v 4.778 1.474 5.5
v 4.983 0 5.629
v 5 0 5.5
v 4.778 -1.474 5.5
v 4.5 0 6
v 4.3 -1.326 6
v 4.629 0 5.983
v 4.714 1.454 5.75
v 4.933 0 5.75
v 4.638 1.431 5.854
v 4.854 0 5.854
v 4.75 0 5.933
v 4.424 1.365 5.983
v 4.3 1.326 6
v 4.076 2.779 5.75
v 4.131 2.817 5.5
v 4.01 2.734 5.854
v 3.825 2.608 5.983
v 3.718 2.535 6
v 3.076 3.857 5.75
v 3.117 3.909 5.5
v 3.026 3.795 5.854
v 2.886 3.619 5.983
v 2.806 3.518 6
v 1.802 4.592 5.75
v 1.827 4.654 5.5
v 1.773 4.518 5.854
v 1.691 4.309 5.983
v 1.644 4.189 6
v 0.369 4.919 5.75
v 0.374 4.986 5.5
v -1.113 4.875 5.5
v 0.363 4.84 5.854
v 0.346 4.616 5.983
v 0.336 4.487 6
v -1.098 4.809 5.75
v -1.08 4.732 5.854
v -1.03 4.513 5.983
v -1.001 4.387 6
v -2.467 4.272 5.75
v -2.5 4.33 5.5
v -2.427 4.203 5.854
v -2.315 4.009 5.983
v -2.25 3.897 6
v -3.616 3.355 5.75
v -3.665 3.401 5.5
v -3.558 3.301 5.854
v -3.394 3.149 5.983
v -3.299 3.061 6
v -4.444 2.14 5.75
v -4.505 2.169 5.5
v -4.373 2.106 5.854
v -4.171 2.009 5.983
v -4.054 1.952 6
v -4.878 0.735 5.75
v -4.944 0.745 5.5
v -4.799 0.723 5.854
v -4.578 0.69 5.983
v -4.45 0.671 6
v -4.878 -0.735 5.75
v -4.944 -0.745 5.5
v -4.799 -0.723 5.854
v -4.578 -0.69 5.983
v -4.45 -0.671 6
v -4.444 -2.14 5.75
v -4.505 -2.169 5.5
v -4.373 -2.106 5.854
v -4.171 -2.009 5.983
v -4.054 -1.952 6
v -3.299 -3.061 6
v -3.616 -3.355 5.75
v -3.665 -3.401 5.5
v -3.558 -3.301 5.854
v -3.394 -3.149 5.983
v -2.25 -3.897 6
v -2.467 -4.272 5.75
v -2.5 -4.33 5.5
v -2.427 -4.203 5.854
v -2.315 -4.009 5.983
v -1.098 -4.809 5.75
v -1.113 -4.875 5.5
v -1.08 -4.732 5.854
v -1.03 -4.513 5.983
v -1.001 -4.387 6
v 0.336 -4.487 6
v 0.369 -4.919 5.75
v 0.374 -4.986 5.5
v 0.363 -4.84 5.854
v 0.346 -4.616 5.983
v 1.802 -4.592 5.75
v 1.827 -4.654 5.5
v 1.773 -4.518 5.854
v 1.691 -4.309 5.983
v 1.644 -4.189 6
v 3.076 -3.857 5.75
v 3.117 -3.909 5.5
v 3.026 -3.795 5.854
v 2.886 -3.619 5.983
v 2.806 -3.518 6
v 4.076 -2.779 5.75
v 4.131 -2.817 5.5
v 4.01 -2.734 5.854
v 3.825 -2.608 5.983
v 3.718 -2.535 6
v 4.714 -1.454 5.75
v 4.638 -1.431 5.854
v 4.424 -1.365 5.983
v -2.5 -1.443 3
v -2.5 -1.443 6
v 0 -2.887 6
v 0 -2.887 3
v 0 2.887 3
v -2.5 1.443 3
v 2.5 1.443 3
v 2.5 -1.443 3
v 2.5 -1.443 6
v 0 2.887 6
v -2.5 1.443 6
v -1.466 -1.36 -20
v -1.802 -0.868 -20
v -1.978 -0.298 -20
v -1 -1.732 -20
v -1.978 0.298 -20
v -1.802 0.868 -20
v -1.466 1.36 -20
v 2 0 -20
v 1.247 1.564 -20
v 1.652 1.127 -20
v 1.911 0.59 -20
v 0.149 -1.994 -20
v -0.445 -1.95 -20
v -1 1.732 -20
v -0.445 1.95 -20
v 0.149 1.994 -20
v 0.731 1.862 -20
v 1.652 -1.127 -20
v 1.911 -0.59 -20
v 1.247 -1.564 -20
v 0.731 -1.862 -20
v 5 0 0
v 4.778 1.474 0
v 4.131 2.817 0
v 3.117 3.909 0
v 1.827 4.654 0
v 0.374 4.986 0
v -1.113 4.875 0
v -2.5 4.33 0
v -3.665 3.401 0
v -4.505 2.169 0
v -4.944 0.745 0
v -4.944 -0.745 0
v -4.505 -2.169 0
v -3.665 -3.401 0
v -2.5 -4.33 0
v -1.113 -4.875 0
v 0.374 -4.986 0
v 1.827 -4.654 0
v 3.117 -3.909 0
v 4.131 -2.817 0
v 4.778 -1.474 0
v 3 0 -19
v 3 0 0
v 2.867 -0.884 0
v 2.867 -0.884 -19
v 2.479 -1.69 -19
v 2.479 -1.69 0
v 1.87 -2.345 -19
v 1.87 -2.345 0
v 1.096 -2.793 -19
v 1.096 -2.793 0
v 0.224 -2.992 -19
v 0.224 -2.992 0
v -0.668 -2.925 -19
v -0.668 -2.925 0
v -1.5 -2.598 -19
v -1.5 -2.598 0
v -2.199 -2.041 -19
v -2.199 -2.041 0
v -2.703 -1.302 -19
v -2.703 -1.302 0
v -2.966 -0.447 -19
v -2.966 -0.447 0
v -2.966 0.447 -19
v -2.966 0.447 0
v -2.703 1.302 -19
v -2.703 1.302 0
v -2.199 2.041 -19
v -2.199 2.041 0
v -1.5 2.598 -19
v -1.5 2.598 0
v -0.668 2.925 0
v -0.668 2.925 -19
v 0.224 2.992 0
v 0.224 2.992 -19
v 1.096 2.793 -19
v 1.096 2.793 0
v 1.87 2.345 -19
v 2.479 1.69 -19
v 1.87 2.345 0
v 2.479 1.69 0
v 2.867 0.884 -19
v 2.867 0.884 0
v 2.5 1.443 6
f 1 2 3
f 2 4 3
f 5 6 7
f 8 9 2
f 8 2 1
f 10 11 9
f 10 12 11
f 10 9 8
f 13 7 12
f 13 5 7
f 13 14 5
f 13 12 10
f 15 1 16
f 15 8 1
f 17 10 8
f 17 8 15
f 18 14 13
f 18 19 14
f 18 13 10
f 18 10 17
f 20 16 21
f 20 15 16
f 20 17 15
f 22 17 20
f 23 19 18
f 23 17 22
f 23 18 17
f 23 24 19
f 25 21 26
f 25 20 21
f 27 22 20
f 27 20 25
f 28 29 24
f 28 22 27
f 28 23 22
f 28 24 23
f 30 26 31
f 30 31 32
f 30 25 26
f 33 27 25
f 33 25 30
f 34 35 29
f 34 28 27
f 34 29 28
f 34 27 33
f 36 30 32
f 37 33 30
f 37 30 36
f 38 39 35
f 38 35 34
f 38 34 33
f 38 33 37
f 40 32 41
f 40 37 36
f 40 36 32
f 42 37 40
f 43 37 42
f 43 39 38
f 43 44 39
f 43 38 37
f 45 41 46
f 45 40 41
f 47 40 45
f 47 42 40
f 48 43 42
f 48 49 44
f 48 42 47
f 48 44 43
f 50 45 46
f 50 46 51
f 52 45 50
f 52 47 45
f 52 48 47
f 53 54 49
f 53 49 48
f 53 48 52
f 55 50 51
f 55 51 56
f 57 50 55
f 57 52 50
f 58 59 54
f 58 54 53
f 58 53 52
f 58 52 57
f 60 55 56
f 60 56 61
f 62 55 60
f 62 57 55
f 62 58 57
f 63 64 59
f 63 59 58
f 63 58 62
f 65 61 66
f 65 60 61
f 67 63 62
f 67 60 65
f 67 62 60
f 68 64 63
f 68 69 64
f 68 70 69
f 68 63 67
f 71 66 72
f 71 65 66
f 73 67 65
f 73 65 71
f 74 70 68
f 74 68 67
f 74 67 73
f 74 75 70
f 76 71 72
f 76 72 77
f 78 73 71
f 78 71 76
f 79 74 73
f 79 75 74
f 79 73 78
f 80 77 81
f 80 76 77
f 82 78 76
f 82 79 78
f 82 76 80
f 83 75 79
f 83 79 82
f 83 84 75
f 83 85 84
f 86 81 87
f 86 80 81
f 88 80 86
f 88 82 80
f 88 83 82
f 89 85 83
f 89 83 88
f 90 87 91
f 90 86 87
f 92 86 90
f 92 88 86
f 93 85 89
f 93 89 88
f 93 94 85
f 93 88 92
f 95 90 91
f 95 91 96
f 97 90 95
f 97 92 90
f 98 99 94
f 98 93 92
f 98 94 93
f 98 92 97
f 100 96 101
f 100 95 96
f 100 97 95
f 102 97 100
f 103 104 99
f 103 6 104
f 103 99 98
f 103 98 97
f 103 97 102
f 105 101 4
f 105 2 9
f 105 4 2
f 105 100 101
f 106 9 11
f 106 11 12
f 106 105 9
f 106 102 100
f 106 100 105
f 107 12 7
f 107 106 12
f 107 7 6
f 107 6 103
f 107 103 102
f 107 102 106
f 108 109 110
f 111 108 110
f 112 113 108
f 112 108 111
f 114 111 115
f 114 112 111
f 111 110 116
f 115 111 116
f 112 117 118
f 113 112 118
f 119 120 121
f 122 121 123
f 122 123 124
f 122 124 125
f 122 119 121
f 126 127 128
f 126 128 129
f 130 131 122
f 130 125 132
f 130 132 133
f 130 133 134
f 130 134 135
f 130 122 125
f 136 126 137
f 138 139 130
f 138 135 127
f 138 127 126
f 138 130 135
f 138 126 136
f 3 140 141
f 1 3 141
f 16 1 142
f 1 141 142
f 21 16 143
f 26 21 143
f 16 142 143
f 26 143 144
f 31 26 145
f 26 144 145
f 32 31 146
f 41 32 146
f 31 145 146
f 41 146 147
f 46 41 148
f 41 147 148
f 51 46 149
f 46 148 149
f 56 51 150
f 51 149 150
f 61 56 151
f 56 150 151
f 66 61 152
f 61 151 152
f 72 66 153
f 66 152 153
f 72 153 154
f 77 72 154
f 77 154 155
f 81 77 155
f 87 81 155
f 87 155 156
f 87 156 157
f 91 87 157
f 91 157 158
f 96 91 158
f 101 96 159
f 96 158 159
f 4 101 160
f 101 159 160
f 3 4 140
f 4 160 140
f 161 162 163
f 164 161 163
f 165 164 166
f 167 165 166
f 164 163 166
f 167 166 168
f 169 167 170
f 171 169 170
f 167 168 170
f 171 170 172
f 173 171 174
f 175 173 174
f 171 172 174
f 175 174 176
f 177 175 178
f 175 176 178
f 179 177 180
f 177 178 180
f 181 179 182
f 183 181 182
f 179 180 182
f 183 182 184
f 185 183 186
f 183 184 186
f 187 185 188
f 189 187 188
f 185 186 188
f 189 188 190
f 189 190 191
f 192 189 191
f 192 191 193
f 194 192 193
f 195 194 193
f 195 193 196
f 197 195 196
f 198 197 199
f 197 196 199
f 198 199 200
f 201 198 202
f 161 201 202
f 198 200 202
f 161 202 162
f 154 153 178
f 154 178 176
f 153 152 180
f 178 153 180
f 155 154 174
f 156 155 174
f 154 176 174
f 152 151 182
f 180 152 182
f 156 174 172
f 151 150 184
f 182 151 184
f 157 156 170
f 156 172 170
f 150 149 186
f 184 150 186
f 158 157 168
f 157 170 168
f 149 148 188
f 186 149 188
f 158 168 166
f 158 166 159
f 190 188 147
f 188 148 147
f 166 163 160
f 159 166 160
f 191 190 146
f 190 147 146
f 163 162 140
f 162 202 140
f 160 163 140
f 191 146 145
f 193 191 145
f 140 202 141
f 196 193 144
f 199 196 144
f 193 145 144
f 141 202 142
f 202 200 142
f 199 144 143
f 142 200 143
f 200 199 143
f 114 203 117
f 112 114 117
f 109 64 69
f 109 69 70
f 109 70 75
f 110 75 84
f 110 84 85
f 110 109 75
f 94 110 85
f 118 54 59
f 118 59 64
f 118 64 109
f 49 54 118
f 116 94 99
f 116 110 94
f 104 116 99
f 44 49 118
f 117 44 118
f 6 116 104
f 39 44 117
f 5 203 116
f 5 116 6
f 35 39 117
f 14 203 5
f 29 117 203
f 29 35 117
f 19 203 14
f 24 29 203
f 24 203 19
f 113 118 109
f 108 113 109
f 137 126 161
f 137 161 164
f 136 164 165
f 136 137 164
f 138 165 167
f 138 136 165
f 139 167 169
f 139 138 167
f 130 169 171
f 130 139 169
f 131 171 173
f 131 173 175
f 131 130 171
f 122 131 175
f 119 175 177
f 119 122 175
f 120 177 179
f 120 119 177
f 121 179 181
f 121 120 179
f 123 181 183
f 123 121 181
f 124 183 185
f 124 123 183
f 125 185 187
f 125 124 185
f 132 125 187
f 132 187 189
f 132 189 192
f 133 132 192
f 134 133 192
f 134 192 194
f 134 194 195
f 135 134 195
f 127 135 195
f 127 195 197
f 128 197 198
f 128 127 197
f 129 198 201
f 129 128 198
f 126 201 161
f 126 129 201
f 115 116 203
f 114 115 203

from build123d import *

# Parameters (mm, degrees)
F0_R     = 5
F1_DEPTH = 6
F2_R     = 0.5
F4_DEPTH = 3
F5_R     = 3
F6_DEPTH = 20
F7_SIZE  = 1


with BuildPart() as f1:
    # F0 (on Top) → F1 (new body)
    with BuildSketch(Plane.XY):
        Circle(F0_R)
    extrude(amount=F1_DEPTH)

    # F2
    f2_edges = [f1.edges().sort_by_distance(p)[0] for p in [
        (-5, 0, 6),
    ]]
    fillet(f2_edges, radius=F2_R)

    # F3 (on face) → F4 (cut)
    with BuildSketch(Plane.XY.offset(6)):
        Polygon((2.5, 1.443376), (0, 2.886751), (-2.5, 1.443376), (-2.5, -1.443376), (0, -2.886751), (2.5, -1.443376), align=None)
    extrude(amount=-F4_DEPTH, mode=Mode.SUBTRACT)

    # F5 (on face) → F6 (join)
    with BuildSketch(Plane(origin=(0, 0, 0), x_dir=(1, 0, 0), z_dir=(0, 0, -1))):
        Circle(F5_R)
    extrude(amount=F6_DEPTH)

    # F7
    f7_edges = [f1.edges().sort_by_distance(p)[0] for p in [
        (-3, 0, -20),
    ]]
    chamfer(f7_edges, length=F7_SIZE)


solid = f1.part
